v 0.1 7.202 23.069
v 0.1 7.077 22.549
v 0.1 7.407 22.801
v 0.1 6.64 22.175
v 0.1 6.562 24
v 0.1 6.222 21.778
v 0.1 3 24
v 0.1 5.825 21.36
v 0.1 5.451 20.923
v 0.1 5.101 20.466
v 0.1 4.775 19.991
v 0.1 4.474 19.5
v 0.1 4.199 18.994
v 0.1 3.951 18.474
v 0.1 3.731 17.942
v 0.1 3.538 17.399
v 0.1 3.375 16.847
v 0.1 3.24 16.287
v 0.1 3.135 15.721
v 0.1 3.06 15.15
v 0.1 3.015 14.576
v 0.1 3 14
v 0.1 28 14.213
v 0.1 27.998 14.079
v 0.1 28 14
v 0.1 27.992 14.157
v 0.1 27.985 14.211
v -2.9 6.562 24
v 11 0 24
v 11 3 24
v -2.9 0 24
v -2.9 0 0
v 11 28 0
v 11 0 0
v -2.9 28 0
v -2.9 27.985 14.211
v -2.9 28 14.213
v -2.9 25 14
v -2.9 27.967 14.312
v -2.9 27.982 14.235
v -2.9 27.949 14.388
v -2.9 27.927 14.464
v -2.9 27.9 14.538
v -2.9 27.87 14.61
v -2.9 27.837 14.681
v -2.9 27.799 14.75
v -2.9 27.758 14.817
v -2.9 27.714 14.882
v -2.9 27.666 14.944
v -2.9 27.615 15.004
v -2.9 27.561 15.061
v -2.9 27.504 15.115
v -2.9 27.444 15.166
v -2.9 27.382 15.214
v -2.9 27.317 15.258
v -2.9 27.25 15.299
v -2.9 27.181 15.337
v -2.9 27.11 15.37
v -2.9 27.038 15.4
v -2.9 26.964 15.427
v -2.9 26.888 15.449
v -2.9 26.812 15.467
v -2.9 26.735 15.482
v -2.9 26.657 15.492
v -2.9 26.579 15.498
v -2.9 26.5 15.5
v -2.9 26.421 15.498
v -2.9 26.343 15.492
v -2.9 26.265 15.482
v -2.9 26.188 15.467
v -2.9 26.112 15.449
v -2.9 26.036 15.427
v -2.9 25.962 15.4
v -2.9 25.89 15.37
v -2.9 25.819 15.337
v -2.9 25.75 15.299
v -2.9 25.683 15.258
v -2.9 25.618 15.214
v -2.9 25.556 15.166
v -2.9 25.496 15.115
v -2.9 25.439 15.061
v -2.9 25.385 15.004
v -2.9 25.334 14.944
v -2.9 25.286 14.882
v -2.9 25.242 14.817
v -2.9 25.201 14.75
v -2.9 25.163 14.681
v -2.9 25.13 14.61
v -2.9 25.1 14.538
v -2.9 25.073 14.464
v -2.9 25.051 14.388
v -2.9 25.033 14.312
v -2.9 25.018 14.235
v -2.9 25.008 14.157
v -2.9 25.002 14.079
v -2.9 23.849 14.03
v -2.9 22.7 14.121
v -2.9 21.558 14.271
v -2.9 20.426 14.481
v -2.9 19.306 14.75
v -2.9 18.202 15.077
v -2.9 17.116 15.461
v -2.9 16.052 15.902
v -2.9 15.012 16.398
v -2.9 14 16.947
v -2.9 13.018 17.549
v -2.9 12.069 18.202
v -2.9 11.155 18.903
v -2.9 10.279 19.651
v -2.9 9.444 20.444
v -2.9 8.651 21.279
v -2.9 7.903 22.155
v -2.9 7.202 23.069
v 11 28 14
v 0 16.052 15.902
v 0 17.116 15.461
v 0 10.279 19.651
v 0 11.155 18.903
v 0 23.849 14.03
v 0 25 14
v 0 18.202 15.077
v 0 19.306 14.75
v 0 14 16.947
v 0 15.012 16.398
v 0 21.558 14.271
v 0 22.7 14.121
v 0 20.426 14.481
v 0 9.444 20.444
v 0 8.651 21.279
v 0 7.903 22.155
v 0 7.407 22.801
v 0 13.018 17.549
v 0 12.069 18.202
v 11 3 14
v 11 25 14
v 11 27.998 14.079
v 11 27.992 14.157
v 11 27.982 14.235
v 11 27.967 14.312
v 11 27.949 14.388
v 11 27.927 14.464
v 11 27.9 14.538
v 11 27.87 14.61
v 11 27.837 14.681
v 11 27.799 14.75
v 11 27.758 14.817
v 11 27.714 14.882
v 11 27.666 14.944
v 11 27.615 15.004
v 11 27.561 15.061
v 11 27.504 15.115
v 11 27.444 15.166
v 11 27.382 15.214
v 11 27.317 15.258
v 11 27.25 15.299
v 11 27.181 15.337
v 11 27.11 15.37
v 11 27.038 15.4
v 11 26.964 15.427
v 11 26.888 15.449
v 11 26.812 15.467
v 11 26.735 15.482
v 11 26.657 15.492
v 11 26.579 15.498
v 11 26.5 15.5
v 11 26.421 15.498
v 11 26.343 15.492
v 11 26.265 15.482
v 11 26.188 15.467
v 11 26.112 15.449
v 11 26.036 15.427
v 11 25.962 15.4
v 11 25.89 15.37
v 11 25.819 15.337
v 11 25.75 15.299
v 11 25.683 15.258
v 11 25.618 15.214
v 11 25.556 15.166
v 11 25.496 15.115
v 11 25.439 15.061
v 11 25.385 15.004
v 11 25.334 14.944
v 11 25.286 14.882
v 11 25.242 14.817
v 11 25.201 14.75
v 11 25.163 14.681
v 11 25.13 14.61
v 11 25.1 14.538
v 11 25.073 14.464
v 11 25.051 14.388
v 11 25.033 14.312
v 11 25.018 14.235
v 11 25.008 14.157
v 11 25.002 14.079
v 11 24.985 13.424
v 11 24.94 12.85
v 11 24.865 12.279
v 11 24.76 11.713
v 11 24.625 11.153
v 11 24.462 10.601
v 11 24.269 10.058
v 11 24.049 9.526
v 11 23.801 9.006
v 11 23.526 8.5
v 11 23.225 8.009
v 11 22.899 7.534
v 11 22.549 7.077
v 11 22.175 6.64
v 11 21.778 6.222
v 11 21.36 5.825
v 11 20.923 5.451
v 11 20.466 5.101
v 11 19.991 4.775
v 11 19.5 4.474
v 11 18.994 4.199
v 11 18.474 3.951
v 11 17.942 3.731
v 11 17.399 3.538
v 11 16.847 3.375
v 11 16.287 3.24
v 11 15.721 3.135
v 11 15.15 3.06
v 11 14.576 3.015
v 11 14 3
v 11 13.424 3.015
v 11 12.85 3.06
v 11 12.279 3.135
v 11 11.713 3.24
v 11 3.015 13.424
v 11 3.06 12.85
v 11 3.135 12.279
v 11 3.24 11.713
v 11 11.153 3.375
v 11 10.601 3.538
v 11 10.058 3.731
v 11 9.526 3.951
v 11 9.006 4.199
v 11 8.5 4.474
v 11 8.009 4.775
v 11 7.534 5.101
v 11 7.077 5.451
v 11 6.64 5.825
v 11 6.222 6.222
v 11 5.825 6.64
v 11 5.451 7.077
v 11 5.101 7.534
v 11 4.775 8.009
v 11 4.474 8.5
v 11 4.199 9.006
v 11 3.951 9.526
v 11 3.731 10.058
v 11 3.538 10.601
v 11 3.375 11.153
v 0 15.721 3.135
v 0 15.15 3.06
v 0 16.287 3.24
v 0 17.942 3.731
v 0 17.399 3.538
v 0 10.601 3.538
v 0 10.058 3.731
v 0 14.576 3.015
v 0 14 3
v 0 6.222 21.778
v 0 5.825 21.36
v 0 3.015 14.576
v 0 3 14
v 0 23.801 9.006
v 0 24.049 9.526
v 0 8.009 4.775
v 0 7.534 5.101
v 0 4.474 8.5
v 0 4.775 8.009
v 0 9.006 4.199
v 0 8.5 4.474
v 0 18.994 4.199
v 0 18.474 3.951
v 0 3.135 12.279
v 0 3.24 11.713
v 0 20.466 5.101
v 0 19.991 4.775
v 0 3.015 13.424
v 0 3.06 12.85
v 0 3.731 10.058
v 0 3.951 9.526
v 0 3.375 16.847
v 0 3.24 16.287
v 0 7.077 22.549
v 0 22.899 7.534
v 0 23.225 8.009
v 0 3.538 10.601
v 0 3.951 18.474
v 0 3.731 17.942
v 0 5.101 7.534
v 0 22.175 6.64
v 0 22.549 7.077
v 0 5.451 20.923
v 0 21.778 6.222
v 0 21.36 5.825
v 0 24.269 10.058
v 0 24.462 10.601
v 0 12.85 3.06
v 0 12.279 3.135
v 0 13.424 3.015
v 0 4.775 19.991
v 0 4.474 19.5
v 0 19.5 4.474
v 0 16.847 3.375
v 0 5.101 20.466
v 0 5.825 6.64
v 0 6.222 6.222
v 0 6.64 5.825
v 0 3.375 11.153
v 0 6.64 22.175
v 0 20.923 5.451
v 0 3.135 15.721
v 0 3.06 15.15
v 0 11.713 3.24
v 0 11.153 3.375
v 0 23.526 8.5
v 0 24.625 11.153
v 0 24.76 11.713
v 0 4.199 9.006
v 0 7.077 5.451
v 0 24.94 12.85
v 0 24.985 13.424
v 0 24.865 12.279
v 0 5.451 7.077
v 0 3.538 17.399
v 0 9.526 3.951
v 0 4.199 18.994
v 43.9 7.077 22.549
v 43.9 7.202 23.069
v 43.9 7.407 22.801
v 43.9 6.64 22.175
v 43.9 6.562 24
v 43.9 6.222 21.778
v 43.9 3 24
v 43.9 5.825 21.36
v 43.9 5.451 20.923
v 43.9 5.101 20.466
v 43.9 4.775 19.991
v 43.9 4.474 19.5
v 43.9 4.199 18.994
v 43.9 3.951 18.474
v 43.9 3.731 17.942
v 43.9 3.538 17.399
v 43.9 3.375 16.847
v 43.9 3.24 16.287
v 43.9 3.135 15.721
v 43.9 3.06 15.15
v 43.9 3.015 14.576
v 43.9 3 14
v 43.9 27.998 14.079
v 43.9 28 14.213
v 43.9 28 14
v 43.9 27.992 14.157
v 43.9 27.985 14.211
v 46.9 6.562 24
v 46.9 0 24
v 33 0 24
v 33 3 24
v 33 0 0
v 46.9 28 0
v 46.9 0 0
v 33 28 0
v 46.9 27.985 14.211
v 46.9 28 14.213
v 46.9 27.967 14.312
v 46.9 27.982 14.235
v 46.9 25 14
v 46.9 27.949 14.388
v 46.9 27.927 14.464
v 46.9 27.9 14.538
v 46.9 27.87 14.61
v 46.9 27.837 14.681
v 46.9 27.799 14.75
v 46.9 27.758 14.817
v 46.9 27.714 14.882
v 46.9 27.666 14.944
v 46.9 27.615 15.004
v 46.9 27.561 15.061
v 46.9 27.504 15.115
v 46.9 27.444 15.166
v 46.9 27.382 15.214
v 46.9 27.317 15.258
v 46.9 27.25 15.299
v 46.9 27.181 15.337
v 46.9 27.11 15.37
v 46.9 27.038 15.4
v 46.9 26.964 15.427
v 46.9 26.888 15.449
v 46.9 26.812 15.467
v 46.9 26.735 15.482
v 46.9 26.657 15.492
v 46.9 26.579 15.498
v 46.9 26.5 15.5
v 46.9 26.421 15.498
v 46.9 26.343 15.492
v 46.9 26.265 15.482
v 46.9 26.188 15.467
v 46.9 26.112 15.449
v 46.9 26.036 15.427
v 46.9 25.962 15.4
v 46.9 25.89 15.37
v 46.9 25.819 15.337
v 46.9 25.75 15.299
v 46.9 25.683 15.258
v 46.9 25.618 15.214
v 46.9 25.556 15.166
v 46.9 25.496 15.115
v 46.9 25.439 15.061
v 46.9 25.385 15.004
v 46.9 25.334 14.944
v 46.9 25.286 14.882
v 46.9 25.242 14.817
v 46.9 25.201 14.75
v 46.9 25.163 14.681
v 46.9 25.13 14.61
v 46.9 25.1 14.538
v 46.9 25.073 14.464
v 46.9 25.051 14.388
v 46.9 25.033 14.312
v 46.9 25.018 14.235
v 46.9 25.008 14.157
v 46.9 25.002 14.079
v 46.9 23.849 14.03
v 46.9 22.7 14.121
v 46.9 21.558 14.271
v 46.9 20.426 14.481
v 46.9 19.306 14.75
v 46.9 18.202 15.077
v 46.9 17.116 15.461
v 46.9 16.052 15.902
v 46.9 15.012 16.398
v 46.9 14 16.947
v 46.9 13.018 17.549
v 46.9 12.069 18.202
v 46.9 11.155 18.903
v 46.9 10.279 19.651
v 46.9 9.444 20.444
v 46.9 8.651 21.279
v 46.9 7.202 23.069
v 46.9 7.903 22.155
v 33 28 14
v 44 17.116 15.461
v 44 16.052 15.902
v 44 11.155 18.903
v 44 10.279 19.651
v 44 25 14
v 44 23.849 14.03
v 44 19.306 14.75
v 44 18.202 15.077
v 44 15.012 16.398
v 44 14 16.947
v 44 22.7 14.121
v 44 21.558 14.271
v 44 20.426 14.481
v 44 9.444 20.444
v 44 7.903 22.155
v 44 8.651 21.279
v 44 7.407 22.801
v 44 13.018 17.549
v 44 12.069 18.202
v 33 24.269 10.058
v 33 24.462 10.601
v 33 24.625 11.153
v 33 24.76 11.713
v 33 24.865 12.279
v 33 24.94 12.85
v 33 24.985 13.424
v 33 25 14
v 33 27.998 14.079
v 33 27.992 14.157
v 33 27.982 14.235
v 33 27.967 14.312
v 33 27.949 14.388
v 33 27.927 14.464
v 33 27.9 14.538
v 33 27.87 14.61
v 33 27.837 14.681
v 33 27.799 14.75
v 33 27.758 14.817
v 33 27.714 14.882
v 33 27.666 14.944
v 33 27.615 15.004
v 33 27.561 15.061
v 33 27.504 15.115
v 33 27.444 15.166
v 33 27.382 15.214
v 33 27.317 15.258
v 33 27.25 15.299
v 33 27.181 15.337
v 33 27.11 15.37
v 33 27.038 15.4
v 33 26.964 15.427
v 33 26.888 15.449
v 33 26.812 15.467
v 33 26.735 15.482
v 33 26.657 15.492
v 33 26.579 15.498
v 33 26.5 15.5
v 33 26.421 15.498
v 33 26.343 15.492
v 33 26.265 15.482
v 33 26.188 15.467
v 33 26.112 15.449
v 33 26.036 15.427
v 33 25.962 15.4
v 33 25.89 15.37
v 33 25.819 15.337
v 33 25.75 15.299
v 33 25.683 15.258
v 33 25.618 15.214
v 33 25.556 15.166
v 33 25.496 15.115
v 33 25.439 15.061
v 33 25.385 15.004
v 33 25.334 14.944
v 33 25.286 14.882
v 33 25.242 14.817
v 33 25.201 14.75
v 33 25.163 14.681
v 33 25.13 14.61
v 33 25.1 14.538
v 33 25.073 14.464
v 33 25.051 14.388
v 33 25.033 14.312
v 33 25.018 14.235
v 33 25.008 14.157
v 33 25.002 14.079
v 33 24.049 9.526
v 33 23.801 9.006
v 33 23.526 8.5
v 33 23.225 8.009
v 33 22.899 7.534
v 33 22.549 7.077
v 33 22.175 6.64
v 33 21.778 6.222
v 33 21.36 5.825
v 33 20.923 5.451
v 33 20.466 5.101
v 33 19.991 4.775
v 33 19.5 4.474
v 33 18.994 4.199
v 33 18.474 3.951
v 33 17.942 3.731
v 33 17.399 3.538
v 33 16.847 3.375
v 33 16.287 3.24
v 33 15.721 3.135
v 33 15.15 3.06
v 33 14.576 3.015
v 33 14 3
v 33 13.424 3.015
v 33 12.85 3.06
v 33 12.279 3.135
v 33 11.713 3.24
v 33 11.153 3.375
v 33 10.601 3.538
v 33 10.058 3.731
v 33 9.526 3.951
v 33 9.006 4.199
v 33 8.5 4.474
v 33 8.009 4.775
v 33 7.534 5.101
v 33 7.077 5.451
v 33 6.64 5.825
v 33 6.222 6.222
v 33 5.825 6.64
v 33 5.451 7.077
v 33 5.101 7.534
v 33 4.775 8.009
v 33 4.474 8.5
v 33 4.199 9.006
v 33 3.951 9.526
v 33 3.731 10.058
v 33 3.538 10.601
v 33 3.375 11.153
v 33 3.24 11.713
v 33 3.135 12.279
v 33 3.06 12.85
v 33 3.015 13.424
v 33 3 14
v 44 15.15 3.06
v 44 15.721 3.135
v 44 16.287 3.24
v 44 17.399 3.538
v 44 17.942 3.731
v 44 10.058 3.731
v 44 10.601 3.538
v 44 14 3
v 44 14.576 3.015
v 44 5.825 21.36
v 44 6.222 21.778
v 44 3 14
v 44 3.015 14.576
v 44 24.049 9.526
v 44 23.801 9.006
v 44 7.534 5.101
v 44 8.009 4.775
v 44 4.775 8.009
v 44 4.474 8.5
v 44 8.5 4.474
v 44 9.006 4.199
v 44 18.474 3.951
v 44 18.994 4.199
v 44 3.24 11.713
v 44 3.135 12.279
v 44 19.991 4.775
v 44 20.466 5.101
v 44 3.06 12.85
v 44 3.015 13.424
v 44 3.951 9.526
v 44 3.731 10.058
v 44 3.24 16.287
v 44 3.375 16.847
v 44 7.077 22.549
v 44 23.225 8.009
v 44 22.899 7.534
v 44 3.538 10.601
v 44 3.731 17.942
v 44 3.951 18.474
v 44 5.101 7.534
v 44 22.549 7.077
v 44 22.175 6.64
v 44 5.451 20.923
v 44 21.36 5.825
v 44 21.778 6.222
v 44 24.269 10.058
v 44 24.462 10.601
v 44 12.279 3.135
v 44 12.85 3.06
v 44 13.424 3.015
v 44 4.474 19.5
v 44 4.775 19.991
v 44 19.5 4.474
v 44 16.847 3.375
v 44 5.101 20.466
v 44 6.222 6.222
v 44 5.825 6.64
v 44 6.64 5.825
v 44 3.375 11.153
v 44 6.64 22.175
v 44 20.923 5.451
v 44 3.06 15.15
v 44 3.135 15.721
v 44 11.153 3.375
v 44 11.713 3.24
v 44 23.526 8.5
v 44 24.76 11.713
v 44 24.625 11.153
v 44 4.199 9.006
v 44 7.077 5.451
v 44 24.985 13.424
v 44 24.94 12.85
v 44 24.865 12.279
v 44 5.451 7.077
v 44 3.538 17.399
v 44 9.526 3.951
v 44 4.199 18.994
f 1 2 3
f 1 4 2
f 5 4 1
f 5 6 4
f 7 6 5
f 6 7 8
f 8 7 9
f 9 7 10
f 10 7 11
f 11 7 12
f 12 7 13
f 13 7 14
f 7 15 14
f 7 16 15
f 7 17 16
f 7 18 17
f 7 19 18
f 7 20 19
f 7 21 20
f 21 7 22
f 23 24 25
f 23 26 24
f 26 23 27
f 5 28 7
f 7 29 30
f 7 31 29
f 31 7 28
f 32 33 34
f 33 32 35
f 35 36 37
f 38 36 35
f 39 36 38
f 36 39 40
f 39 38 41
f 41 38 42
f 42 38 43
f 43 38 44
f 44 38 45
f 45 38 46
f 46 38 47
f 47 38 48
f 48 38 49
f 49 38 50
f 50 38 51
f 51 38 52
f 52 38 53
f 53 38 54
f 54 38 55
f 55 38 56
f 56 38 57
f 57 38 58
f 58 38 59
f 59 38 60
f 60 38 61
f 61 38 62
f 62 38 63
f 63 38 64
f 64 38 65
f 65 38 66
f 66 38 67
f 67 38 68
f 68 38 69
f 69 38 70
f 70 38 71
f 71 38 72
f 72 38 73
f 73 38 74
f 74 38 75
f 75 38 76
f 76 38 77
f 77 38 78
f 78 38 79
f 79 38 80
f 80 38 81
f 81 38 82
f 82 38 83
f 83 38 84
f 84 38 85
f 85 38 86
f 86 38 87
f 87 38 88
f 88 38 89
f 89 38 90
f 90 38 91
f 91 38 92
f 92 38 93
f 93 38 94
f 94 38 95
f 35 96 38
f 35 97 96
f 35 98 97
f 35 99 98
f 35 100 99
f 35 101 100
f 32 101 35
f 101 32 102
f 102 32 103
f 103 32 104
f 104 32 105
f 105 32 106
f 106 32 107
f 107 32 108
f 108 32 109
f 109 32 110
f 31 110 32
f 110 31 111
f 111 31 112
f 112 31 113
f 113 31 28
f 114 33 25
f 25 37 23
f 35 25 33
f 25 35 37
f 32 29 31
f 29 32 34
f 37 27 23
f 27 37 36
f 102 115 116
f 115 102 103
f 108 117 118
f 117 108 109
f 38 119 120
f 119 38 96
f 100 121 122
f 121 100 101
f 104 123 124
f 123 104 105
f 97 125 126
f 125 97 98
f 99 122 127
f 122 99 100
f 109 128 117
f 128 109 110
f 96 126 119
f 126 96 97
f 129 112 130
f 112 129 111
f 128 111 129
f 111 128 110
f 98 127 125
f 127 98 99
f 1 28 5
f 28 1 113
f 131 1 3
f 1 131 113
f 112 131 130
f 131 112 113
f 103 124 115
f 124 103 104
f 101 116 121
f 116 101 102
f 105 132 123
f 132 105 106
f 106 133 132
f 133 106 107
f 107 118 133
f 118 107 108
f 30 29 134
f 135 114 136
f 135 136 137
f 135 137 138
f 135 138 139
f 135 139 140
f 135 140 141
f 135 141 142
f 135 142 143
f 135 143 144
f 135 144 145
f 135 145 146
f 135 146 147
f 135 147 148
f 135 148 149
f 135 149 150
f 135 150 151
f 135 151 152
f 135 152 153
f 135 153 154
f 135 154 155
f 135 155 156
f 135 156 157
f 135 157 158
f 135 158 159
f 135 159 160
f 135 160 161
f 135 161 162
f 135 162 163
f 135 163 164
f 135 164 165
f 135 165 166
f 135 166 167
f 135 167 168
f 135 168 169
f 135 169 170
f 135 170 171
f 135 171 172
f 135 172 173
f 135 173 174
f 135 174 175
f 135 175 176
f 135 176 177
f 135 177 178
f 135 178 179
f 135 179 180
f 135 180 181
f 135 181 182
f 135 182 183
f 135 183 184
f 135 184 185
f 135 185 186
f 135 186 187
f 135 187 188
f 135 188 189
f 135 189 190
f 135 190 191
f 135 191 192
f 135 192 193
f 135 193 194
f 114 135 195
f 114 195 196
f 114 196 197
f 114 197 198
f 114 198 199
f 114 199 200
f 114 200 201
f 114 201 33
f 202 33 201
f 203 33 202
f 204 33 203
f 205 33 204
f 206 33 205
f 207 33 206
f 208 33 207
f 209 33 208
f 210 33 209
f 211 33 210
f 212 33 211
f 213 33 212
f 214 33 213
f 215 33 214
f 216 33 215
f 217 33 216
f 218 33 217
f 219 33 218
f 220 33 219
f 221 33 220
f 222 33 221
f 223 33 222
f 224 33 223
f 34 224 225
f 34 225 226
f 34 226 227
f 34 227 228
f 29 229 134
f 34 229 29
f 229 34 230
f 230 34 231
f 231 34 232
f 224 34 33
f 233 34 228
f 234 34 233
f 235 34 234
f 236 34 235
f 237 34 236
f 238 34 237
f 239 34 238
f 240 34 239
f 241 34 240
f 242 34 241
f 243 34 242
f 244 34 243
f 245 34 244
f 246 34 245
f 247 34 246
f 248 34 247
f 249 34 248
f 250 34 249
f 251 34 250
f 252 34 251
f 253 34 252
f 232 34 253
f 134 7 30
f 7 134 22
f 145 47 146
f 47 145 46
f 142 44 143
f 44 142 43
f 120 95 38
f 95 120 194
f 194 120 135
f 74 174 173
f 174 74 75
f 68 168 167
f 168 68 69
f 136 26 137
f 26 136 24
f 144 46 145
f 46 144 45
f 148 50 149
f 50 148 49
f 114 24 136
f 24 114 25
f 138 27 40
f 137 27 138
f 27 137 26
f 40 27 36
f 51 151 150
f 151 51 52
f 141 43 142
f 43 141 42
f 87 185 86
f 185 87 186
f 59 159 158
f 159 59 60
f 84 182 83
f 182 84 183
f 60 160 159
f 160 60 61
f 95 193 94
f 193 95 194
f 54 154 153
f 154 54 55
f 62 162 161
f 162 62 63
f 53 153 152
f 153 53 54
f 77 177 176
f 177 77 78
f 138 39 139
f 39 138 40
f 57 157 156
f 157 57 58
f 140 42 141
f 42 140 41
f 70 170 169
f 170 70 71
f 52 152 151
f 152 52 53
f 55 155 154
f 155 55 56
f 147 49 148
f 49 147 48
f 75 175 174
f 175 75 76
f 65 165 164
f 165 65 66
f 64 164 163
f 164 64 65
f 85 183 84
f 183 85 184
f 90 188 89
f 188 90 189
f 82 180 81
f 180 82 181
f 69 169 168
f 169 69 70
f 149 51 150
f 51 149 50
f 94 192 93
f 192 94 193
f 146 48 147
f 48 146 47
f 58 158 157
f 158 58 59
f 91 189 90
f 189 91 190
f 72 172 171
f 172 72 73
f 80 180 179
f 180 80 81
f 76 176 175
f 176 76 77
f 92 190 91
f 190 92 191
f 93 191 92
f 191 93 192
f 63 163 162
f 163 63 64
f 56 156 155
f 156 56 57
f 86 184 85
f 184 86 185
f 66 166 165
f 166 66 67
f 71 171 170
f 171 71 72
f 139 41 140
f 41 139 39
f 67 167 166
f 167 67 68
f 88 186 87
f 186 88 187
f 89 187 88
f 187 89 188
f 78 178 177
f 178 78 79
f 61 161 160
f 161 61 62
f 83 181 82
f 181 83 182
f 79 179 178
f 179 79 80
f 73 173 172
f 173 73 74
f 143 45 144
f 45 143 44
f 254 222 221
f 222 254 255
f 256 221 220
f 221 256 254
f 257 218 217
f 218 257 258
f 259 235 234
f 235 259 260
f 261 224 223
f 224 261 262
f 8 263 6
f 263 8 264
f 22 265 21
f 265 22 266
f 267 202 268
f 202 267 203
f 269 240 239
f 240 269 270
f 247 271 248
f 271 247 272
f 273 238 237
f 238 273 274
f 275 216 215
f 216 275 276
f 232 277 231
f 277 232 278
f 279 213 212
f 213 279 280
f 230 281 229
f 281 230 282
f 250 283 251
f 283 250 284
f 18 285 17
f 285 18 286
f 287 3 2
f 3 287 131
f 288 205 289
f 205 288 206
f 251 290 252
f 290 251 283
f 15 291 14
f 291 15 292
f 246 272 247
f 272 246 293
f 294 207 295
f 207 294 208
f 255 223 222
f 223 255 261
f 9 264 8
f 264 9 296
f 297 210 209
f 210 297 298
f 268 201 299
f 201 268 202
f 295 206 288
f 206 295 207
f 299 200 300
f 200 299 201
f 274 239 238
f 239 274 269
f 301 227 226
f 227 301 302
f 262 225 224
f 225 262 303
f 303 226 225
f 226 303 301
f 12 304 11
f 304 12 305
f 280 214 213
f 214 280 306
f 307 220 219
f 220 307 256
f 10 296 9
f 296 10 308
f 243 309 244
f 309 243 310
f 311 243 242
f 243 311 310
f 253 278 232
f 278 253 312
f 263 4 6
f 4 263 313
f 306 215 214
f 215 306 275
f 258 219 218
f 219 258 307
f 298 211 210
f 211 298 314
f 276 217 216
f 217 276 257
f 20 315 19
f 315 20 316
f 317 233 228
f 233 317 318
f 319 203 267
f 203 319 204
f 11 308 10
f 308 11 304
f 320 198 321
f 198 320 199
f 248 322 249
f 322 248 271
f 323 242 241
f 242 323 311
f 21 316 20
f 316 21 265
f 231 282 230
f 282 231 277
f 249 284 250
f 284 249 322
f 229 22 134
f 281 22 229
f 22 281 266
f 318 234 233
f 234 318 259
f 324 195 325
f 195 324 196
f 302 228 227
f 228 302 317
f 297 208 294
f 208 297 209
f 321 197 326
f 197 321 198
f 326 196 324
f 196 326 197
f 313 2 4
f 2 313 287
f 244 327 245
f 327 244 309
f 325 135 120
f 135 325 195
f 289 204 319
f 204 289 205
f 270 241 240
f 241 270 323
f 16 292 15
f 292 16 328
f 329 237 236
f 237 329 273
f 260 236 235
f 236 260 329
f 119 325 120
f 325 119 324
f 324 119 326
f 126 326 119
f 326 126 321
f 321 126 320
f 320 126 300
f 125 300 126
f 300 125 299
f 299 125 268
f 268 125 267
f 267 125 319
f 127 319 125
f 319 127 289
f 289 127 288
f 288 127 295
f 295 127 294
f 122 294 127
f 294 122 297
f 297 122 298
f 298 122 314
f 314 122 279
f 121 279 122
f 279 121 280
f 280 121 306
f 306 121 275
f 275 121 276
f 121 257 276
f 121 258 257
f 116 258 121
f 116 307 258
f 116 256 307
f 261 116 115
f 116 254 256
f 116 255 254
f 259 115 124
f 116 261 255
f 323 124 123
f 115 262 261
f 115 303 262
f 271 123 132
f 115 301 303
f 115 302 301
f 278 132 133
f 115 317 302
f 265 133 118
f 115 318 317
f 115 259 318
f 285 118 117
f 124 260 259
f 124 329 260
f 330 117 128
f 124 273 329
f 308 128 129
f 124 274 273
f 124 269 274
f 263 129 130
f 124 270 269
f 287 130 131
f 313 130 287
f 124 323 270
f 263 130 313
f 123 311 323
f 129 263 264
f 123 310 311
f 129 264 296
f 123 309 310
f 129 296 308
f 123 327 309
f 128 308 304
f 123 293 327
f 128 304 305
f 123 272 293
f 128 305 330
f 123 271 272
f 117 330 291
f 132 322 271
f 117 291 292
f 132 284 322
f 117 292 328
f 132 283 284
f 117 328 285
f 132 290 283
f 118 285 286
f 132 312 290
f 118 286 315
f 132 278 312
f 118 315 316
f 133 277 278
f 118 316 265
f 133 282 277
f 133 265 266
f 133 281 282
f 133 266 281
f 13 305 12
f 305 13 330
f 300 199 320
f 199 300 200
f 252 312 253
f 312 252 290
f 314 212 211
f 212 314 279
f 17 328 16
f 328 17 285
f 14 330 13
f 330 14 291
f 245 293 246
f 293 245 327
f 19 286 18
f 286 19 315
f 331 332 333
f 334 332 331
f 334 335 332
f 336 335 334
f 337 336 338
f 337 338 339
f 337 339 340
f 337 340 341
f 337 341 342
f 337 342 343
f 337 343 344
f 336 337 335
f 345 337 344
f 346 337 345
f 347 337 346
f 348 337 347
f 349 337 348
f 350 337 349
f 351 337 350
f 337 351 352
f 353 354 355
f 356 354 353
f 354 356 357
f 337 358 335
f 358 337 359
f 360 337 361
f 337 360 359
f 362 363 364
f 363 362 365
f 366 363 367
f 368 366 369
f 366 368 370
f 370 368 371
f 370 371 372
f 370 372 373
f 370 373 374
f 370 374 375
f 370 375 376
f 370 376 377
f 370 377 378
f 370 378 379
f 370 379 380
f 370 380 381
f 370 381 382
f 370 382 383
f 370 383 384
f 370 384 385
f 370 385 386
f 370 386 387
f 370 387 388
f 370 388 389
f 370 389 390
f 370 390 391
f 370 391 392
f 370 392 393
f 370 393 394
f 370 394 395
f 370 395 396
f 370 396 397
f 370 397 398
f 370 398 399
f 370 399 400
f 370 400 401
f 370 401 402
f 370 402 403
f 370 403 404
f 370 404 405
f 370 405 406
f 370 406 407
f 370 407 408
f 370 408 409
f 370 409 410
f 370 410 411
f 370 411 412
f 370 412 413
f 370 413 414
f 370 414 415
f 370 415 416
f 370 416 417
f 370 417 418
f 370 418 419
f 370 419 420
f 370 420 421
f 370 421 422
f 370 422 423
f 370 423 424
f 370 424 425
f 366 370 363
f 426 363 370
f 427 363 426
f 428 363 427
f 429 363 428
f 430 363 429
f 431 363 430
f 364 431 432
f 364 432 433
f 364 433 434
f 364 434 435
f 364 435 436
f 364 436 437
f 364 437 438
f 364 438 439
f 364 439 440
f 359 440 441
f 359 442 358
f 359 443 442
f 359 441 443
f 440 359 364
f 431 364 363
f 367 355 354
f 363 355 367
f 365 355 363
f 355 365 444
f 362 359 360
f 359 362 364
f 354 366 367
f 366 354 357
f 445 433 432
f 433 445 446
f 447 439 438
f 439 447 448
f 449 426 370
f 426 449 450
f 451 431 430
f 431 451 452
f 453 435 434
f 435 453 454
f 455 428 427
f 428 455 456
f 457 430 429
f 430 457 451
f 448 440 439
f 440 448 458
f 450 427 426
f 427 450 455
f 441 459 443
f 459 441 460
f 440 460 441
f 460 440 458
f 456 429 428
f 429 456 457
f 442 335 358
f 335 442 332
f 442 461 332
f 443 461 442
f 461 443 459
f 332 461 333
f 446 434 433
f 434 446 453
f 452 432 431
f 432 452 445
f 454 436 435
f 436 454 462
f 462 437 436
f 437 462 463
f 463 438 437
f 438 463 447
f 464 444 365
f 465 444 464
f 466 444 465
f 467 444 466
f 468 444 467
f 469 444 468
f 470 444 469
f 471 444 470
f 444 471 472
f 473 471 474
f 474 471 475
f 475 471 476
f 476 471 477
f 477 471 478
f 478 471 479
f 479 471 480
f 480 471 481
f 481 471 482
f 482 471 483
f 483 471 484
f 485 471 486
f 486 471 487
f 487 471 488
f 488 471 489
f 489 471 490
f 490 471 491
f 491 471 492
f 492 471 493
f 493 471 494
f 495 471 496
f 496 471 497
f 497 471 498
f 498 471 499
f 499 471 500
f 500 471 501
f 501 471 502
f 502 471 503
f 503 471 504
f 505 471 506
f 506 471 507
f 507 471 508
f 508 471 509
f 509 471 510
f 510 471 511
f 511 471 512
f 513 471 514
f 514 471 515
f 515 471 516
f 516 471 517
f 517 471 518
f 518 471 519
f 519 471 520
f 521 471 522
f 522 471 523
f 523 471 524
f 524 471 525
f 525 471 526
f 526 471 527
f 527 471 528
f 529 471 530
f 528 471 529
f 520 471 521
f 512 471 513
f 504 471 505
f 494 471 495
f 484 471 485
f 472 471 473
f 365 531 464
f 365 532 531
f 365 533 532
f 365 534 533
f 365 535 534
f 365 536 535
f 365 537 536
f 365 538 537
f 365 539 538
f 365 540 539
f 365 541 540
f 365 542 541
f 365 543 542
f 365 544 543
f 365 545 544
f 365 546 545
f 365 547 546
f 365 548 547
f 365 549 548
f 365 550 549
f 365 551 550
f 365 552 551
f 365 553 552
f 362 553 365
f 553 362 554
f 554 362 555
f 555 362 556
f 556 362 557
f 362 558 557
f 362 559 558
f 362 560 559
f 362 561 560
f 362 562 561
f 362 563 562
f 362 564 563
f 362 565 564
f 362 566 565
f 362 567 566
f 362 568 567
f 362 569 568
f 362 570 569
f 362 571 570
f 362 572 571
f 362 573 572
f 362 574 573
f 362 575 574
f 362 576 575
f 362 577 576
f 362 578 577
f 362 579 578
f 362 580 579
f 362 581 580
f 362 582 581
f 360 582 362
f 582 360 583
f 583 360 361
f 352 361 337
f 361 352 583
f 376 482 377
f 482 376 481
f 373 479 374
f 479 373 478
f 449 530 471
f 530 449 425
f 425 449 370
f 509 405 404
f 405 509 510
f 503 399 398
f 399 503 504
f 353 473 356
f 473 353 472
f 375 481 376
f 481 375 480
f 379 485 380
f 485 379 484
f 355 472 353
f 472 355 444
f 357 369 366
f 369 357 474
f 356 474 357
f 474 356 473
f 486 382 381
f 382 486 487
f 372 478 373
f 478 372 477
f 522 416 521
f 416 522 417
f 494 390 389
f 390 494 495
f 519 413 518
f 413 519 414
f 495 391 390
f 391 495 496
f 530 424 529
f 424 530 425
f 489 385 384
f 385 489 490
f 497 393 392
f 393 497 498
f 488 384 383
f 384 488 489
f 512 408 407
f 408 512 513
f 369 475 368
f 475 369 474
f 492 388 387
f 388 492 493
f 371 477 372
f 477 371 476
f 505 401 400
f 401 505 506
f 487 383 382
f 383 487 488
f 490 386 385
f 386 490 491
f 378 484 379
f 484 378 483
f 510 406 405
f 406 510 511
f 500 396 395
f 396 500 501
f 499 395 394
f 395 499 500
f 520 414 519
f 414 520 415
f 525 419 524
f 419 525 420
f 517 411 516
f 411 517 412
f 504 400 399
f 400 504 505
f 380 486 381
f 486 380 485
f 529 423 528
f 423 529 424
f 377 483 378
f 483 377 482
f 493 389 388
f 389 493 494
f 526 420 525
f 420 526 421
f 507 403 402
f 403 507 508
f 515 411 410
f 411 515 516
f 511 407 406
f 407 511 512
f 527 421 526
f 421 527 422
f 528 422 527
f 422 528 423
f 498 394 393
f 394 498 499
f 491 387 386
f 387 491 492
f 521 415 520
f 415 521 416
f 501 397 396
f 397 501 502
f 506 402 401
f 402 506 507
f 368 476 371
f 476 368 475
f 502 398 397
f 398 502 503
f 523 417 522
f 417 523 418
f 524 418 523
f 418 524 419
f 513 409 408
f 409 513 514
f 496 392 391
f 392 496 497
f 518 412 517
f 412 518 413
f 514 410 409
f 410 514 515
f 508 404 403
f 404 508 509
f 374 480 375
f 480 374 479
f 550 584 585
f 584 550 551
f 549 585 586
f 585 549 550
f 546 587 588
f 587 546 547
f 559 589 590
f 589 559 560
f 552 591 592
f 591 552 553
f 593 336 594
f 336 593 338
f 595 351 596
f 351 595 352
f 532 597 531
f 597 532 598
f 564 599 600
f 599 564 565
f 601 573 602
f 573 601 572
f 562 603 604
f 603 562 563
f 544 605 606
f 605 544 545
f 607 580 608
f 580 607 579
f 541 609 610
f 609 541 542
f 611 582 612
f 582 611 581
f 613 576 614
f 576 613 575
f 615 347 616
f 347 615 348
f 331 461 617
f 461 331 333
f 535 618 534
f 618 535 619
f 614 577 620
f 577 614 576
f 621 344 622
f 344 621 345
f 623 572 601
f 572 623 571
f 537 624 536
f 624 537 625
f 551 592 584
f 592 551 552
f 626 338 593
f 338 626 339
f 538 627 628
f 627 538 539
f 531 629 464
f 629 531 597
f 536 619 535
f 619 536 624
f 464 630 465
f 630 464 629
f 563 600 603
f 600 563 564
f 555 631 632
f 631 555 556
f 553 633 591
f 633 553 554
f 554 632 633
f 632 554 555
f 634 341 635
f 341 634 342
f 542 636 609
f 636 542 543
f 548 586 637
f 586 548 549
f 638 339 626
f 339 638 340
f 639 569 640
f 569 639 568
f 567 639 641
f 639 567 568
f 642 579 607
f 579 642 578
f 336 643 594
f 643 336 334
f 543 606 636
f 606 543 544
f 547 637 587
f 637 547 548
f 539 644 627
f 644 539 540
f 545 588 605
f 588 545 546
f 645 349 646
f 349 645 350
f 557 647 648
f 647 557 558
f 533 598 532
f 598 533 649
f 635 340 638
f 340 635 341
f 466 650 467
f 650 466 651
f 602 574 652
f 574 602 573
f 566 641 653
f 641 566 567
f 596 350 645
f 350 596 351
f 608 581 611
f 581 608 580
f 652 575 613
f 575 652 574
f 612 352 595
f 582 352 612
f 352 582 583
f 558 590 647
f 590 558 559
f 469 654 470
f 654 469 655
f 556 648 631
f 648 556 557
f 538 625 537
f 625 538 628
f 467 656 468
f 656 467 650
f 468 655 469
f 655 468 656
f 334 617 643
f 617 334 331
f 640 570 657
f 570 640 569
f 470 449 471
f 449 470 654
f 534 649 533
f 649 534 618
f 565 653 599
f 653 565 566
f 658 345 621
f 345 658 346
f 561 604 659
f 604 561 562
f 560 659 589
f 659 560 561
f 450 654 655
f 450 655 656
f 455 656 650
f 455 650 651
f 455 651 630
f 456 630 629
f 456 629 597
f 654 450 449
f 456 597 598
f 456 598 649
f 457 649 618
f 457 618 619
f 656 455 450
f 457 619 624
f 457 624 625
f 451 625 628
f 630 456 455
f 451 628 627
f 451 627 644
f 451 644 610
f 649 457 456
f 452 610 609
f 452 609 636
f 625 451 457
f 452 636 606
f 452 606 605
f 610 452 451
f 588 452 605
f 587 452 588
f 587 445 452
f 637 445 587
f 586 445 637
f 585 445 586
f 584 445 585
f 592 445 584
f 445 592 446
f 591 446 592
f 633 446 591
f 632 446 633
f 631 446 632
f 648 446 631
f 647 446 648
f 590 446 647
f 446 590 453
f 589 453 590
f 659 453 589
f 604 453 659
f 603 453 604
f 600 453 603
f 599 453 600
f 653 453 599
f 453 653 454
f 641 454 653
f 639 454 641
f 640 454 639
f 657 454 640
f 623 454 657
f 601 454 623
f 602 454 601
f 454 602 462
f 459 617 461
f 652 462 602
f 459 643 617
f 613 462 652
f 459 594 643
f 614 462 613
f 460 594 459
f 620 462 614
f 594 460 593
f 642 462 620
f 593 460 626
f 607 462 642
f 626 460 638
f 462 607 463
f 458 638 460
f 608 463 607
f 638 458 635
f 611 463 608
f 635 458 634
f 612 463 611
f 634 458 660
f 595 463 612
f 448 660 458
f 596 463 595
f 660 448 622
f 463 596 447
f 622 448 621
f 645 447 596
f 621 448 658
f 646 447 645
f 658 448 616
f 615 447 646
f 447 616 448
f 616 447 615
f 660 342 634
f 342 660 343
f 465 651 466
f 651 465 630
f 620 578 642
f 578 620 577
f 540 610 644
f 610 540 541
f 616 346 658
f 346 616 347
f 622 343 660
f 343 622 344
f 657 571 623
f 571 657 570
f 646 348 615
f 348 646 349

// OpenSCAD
/*=========================================
Program Name :	WhiteBoard Marker support
Base Language:	English
Created by   :	Esmarra
Creation Date:	18/04/2014 03:57
Rework date entries:
	21/03/2015 Design Now Compatible with Customizer, polished Comments and variables

Program Objectives: Create a mount for my marker
Observations: It was 2 stl's A part and B
Special Thanks:
=========================================*/

// preview[view:north west, tilt:top diagonal]

// Type In Pen Diameter
pen_d=20  ;
//Enter Pen Diameter + 2 for the gap

// Select Wall Thickness
wall_thick=3 ; 									
//Printed With thickness = 2

/* [Hidden] */
pen_size=pen_d + 2 ; 						// Pen diameter + small gap

wall_h=pen_d/2 +pen_size/2+wall_thick; 		// Biggest Wall Height
$fn=120;
//=============
module support(){
	module base(){
		cube([pen_size/2,wall_thick,wall_h]);
		cube([pen_size/2,pen_size+2*wall_thick,wall_thick+pen_size/2]);
		//pretty
		difference(){
			translate([-wall_thick+.1,0,0]) cube([wall_thick,pen_size+2*wall_thick,wall_h]);
			translate([-wall_thick,pen_size+wall_thick,wall_thick+pen_size/2+pen_size])rotate([0,90,0])cylinder(wall_thick+.2,pen_size,pen_size);			// Edge Slice 
		}
		translate([-wall_thick+.1,pen_size+2*wall_thick-(wall_thick/2),wall_thick+pen_size/2])rotate([0,90,0])cylinder(pen_size/2+wall_thick-.1,wall_thick/2,wall_thick/2);		// Smoth Edge
	}
	difference(){
		base();
		translate([0,wall_thick+pen_size/2,wall_thick+pen_size/2])rotate([0,90,0])cylinder(pen_size/2+.1,pen_size/2,pen_size/2);		// Pen
	}
}

//=============

//=============
module A(){
	support();
}
//=============

//=============
module B(){
	mirror([1,0,0])support();
}
//=============

//=============
module final(){
	support();
	translate([2*pen_size,0,0])mirror([1,0,0])support();
}
//=============


final();


